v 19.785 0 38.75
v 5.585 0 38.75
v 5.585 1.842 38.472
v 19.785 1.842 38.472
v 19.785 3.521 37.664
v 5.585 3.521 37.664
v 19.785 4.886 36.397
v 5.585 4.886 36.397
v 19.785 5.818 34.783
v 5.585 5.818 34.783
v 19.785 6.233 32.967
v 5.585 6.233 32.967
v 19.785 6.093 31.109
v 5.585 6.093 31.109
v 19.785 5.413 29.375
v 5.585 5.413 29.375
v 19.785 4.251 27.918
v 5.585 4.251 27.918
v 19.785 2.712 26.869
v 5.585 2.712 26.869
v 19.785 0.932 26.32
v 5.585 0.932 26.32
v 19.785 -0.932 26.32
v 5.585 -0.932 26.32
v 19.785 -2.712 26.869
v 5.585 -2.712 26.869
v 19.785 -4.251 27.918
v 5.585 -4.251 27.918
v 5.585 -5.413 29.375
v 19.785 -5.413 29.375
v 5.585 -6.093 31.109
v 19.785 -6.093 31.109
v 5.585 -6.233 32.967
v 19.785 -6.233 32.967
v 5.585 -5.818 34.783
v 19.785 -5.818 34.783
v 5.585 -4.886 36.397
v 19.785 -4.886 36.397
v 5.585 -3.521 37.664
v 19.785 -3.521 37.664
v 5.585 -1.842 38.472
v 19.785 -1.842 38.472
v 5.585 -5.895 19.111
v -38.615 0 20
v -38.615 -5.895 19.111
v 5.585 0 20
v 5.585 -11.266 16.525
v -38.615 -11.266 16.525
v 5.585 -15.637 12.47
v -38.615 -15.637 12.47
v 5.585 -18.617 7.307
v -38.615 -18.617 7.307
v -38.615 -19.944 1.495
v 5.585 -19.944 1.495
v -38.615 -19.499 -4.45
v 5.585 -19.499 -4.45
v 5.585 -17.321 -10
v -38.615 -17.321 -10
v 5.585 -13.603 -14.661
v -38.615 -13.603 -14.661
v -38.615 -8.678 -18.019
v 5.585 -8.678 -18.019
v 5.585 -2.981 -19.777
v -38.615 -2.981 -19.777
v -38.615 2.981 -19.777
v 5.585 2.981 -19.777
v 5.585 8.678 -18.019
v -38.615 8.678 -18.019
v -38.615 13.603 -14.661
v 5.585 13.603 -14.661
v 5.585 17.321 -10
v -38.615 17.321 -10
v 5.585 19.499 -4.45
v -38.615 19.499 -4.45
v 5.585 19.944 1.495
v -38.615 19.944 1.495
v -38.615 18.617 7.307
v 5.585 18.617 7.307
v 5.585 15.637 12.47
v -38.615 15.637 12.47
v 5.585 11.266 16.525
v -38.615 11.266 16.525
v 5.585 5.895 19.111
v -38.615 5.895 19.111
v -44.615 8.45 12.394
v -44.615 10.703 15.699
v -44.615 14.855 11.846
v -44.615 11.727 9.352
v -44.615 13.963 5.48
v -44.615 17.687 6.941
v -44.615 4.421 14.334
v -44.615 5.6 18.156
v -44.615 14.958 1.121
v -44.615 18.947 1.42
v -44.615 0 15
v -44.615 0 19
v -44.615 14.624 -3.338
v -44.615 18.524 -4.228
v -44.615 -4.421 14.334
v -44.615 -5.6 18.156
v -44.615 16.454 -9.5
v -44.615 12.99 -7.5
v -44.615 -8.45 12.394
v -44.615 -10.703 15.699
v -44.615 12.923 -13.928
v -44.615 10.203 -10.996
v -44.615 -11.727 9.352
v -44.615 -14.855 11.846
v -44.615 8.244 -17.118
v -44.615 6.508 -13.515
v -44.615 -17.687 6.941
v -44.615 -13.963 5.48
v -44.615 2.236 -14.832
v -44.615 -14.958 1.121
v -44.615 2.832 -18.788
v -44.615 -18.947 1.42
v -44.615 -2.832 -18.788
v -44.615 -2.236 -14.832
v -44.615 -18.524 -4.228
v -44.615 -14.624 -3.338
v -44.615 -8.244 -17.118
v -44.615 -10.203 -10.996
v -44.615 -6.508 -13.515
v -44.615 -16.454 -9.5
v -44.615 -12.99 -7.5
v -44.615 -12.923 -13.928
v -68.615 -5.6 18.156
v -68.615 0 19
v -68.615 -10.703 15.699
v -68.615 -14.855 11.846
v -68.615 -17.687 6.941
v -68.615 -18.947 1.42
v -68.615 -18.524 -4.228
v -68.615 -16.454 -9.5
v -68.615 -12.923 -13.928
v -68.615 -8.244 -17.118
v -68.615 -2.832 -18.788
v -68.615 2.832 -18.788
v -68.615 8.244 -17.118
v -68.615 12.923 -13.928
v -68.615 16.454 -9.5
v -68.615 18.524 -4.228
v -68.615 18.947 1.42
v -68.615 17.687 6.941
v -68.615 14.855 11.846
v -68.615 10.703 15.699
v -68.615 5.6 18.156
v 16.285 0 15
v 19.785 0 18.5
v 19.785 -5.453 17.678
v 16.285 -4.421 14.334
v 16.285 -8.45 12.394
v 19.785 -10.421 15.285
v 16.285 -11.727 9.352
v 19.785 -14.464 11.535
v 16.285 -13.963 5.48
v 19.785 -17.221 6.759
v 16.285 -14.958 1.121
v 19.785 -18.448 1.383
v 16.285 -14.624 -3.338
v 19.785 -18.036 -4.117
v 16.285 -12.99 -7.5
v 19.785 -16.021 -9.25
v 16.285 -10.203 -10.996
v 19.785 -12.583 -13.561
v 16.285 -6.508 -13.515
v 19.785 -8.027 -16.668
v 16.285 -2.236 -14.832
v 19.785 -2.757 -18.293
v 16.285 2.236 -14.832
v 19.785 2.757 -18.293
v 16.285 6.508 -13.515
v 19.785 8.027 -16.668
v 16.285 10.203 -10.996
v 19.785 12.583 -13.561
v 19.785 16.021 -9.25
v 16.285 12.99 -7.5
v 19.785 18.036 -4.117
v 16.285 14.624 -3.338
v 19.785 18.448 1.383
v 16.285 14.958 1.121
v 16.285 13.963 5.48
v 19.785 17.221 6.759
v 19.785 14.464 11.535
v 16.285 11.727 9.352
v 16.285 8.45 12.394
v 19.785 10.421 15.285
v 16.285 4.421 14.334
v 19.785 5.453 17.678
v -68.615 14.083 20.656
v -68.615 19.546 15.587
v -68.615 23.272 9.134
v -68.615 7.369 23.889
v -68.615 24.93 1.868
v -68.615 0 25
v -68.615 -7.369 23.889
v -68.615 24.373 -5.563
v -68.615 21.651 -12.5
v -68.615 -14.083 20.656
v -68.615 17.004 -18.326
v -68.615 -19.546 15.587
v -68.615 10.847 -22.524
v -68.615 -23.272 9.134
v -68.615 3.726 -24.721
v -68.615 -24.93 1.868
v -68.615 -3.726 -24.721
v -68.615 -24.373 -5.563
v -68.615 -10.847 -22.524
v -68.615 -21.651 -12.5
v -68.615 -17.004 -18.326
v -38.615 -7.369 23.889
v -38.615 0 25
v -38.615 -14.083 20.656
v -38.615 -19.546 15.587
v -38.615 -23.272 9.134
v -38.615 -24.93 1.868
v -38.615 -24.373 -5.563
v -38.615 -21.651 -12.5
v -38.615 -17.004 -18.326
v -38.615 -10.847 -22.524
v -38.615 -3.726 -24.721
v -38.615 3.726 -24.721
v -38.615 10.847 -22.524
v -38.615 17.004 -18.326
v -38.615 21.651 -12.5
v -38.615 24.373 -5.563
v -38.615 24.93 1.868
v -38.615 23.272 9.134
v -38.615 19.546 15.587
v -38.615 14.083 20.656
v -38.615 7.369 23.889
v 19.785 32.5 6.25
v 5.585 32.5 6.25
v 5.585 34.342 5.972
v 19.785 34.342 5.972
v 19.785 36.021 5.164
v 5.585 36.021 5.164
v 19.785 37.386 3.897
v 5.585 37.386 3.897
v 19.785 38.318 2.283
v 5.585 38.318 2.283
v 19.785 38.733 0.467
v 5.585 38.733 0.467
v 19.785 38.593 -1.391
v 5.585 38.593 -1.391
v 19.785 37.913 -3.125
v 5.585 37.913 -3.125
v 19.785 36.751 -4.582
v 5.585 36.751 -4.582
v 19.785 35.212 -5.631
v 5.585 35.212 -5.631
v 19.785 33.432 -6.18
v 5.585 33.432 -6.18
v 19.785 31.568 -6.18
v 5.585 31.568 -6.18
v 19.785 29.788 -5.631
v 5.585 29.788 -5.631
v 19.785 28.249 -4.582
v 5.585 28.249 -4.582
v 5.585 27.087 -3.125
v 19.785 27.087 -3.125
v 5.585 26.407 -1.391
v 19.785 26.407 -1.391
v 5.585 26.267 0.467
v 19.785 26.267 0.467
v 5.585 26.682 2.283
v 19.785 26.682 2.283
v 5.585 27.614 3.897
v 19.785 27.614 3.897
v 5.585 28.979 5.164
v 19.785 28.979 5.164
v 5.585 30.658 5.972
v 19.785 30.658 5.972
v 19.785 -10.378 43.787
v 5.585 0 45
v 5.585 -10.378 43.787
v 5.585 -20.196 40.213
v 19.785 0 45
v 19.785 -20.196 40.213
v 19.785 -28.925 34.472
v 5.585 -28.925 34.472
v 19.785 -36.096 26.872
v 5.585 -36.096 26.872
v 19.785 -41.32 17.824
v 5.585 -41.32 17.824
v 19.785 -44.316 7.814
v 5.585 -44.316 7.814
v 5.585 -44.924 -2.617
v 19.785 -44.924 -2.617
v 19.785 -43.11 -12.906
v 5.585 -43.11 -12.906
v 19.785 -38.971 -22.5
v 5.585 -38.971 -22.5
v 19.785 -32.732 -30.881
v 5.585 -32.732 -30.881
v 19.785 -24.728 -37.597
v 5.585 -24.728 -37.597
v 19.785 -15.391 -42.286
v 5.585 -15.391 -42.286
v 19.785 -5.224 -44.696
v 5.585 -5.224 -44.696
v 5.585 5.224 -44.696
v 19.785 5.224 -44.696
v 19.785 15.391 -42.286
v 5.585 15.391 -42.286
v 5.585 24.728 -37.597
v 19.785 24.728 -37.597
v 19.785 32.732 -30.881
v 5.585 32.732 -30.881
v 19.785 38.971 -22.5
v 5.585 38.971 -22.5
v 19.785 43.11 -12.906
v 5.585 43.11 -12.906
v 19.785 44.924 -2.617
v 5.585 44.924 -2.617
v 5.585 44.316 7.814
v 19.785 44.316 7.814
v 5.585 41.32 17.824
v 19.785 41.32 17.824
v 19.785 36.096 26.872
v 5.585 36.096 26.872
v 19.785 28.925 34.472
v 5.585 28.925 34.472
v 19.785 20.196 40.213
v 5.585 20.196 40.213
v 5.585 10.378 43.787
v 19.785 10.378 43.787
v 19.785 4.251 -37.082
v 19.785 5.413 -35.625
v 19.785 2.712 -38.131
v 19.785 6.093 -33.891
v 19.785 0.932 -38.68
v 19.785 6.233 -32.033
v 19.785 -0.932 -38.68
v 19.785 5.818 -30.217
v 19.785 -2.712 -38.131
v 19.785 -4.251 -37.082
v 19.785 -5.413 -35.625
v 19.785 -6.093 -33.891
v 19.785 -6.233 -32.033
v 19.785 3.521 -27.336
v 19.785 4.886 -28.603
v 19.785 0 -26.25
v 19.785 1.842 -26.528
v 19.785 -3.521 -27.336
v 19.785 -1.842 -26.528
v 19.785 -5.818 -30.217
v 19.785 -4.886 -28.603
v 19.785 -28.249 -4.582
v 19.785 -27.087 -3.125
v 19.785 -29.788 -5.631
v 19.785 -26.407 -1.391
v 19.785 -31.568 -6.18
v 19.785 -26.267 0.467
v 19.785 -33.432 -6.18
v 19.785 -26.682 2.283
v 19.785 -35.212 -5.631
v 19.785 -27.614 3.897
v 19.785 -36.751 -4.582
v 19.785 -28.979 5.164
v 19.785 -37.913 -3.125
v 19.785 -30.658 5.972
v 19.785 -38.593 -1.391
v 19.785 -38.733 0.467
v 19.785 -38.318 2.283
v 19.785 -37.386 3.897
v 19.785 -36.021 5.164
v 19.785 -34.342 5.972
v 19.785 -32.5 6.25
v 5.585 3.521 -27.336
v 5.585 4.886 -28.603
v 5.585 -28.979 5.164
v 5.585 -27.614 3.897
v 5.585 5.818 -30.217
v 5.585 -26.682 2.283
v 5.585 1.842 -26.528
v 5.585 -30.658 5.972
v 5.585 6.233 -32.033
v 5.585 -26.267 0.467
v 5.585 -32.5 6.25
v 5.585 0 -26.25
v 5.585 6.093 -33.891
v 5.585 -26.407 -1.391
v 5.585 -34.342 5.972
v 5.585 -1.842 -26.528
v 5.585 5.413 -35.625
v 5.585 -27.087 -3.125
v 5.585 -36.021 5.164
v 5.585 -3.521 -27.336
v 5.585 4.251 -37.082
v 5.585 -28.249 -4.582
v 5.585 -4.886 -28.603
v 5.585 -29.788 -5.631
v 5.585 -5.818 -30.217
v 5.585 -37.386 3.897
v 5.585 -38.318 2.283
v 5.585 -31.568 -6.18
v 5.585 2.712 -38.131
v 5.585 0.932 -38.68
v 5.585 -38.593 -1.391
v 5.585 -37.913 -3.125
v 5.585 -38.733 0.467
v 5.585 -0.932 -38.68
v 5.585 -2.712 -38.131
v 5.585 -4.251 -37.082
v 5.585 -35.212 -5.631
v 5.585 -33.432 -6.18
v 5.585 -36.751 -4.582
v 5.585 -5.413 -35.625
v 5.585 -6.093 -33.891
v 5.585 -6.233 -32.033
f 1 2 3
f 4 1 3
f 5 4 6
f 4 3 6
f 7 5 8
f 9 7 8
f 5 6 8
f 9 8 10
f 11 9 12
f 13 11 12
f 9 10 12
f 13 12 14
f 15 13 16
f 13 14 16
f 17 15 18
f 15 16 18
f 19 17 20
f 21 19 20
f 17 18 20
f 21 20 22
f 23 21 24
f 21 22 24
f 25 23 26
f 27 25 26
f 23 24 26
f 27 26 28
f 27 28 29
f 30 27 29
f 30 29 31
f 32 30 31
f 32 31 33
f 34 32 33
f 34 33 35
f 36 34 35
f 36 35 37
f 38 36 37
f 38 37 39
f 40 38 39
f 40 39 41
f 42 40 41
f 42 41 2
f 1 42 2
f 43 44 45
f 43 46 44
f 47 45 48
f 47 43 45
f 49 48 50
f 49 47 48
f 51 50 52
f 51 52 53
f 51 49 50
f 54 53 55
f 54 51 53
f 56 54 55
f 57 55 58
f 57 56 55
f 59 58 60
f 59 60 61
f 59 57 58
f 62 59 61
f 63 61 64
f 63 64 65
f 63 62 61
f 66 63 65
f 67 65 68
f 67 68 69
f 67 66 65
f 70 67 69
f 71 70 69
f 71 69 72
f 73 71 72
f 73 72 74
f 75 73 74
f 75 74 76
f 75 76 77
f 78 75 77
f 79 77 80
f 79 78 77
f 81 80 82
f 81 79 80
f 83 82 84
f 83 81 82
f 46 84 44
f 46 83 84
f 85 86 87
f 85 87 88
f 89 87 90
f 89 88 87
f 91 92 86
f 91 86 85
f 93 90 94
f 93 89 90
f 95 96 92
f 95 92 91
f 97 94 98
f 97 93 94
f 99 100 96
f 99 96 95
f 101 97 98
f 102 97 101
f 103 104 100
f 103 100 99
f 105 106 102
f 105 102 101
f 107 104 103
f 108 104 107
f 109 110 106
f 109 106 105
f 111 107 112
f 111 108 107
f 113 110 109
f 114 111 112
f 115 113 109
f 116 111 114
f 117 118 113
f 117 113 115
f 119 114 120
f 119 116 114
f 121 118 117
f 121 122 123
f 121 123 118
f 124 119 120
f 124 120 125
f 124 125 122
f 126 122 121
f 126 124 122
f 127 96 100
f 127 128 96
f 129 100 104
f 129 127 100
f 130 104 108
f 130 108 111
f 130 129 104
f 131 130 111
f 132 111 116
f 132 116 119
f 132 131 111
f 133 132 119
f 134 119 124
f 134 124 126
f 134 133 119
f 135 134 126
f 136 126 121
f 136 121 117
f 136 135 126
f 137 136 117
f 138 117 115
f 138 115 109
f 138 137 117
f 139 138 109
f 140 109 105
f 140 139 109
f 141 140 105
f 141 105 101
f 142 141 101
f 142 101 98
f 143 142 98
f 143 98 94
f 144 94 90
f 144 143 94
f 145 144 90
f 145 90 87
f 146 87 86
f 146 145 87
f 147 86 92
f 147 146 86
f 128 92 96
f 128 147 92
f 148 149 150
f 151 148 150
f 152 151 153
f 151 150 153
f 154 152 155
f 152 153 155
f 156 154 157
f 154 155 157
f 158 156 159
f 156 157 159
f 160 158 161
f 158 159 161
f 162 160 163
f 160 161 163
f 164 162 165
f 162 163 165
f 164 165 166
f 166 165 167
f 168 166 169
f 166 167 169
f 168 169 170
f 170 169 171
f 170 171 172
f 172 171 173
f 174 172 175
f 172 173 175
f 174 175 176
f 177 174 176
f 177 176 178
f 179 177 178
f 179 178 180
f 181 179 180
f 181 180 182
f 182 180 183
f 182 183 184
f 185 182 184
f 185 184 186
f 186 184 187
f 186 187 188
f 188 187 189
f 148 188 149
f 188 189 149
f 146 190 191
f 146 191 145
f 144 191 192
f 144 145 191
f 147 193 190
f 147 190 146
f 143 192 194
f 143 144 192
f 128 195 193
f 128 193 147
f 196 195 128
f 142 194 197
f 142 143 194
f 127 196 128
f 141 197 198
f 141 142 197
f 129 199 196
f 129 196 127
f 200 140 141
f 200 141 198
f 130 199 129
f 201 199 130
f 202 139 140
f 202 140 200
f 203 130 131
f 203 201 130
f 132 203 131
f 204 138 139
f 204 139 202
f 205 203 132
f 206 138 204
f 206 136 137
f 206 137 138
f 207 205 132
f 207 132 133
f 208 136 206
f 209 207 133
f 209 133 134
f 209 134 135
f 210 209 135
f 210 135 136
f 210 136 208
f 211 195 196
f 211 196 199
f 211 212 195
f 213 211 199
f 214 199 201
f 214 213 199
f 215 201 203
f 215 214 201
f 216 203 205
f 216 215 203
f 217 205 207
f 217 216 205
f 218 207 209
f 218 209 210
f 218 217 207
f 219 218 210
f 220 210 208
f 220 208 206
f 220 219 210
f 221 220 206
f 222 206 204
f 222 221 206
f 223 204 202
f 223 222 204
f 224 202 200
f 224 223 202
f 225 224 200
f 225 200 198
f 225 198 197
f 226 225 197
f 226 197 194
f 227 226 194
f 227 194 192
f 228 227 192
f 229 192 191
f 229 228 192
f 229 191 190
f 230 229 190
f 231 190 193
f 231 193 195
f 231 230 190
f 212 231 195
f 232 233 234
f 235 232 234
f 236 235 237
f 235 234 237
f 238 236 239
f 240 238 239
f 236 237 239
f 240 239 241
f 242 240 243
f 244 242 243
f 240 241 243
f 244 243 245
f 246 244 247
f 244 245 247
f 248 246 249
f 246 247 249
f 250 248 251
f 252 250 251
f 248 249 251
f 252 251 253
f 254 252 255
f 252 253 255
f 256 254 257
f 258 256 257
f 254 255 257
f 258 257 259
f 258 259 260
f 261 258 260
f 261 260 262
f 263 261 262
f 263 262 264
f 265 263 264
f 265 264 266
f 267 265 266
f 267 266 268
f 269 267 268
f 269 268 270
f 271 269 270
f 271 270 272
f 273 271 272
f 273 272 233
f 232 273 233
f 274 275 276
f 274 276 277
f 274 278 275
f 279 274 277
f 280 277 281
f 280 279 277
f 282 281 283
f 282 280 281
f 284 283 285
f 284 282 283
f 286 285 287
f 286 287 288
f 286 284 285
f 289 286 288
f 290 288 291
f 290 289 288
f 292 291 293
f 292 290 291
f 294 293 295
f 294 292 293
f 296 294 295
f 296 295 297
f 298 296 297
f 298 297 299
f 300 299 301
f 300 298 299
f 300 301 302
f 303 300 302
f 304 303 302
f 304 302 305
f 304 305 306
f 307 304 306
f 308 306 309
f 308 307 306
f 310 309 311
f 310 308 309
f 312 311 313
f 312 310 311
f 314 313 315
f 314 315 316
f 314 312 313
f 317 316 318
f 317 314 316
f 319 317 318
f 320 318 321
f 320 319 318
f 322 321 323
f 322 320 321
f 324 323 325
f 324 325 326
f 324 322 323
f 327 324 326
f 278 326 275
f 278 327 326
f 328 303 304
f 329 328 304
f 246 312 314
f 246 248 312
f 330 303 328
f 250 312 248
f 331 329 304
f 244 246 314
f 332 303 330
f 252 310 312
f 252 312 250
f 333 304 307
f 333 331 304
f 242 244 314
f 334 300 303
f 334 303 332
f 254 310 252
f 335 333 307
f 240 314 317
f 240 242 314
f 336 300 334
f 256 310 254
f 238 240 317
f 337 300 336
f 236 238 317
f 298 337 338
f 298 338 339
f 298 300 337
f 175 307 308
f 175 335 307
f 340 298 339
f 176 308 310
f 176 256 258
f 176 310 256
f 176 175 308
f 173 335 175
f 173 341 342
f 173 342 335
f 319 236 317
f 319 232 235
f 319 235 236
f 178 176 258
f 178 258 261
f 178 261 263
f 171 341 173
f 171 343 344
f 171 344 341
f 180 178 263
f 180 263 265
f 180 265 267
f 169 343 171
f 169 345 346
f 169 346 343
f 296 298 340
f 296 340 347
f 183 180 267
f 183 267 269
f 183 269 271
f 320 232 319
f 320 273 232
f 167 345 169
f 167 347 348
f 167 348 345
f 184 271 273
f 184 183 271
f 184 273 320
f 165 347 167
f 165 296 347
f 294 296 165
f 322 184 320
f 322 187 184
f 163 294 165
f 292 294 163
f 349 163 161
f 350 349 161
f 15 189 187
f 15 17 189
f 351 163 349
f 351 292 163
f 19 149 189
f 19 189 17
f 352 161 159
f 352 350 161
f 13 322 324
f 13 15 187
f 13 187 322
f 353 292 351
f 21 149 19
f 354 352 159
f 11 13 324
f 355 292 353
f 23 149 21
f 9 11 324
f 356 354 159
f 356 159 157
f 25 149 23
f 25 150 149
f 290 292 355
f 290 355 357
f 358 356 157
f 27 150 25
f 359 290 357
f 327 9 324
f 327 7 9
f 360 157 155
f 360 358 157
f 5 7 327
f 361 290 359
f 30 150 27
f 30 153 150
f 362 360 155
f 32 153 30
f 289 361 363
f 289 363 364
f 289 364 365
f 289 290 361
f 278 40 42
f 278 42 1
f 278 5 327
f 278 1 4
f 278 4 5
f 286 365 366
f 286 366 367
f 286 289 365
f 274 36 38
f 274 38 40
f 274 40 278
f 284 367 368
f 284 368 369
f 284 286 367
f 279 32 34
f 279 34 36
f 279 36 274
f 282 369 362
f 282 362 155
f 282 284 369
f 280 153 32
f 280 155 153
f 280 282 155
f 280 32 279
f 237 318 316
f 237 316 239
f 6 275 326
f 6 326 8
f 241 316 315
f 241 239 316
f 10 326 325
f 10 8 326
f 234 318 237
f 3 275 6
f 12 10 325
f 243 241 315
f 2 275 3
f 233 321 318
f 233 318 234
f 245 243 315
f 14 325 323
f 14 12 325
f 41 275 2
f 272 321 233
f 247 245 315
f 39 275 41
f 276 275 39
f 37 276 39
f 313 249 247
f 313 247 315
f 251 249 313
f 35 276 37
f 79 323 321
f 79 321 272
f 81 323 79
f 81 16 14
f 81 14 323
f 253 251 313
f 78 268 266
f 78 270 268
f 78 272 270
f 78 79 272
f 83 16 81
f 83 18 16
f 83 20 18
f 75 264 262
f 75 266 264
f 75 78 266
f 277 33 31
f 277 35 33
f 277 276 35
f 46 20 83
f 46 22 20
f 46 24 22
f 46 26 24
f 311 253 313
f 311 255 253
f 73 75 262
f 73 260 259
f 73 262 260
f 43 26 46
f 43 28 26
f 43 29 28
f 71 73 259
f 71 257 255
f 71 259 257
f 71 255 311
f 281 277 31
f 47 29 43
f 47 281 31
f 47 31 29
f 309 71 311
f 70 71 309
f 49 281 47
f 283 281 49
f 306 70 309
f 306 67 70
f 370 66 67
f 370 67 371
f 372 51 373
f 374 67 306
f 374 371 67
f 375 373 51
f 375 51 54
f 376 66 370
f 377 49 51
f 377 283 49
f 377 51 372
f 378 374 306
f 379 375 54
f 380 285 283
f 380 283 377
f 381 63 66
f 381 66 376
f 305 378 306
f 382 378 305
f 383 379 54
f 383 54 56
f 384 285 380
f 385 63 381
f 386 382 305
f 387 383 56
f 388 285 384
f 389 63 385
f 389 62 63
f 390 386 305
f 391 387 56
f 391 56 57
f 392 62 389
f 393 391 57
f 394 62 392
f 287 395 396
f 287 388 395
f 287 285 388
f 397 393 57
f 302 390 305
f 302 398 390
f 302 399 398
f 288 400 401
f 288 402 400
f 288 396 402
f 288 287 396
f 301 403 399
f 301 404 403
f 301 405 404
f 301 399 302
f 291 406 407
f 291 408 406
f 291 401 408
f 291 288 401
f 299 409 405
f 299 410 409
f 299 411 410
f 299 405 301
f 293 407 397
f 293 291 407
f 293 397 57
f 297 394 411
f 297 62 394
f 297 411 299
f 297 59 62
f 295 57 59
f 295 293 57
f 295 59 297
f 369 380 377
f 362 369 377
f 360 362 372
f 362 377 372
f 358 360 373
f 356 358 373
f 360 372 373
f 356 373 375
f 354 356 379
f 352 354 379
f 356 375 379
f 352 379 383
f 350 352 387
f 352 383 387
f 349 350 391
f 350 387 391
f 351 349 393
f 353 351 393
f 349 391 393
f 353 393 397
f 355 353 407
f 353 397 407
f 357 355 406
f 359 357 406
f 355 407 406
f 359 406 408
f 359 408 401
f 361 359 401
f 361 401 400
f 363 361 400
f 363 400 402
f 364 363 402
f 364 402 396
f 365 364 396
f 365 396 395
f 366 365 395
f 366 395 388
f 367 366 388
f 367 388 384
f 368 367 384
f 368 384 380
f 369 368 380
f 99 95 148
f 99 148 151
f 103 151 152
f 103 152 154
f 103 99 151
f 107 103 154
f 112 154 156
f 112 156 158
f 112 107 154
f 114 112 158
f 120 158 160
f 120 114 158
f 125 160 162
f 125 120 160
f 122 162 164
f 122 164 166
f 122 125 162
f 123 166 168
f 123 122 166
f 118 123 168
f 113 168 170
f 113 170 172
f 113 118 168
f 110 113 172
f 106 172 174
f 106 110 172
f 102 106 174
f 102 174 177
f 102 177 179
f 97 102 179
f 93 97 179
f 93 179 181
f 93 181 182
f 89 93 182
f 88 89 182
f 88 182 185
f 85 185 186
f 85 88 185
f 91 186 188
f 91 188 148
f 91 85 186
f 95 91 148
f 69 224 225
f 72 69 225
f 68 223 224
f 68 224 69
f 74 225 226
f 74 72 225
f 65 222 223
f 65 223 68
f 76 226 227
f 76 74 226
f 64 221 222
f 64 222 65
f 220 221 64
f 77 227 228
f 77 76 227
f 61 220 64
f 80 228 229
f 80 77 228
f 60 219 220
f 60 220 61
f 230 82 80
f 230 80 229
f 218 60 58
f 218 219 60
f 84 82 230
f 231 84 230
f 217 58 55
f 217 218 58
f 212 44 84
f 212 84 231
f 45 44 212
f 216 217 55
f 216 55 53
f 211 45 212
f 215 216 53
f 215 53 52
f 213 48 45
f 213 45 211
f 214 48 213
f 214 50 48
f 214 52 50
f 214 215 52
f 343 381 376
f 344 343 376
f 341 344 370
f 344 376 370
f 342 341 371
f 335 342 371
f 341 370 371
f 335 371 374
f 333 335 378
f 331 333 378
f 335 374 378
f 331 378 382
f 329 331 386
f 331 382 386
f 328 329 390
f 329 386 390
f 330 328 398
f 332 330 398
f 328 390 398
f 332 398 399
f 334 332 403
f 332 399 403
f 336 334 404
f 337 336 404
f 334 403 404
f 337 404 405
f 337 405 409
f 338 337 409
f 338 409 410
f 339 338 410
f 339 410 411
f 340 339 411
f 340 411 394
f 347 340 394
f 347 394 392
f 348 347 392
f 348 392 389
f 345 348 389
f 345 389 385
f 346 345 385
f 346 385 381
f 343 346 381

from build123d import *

# Parameters (mm, degrees)
CHAFL_N1_SIZE         = 3.5
CROQUIS2_R            = 6.25
CORTAR_EXTRUIR2_DEPTH = 27


with BuildPart() as part:
    # Croquis1 → Revolución1 (revolve)
    with BuildSketch(Plane.XY, mode=Mode.PRIVATE) as revoluci_n1_sk:
        Polygon((19.784615385, 15), (-44.615384615, 15), (-44.615384615, 19), (-68.615384615, 19), (-68.615384615, 25), (-38.615384615, 25), (-38.615384615, 20), (5.584615385, 20), (5.584615385, 45), (19.784615385, 45), align=None)
    revolve(revoluci_n1_sk.sketch.rotate(Axis((0, 0, 0), (1, 0, 0)), 90), axis=Axis((0, 0, 0), (1, 0, 0)))

    # Chaflán1
    chafl_n1_edges = [part.edges().sort_by_distance(p)[0] for p in [
        (19.784615385, 0, -15),
    ]]
    chamfer(chafl_n1_edges, length=CHAFL_N1_SIZE)

    # Croquis2 → Cortar-Extruir2 (cut)
    with BuildSketch(Plane.ZY.offset(-5.584615385)):
        with Locations((0, 32.5)):
            Circle(CROQUIS2_R)
        with Locations((0, -32.5)):
            Circle(CROQUIS2_R)
        with Locations((32.5, 0)):
            Circle(CROQUIS2_R)
        with Locations((-32.5, 0)):
            Circle(CROQUIS2_R)
    extrude(amount=-CORTAR_EXTRUIR2_DEPTH, mode=Mode.SUBTRACT)


solid = part.part
